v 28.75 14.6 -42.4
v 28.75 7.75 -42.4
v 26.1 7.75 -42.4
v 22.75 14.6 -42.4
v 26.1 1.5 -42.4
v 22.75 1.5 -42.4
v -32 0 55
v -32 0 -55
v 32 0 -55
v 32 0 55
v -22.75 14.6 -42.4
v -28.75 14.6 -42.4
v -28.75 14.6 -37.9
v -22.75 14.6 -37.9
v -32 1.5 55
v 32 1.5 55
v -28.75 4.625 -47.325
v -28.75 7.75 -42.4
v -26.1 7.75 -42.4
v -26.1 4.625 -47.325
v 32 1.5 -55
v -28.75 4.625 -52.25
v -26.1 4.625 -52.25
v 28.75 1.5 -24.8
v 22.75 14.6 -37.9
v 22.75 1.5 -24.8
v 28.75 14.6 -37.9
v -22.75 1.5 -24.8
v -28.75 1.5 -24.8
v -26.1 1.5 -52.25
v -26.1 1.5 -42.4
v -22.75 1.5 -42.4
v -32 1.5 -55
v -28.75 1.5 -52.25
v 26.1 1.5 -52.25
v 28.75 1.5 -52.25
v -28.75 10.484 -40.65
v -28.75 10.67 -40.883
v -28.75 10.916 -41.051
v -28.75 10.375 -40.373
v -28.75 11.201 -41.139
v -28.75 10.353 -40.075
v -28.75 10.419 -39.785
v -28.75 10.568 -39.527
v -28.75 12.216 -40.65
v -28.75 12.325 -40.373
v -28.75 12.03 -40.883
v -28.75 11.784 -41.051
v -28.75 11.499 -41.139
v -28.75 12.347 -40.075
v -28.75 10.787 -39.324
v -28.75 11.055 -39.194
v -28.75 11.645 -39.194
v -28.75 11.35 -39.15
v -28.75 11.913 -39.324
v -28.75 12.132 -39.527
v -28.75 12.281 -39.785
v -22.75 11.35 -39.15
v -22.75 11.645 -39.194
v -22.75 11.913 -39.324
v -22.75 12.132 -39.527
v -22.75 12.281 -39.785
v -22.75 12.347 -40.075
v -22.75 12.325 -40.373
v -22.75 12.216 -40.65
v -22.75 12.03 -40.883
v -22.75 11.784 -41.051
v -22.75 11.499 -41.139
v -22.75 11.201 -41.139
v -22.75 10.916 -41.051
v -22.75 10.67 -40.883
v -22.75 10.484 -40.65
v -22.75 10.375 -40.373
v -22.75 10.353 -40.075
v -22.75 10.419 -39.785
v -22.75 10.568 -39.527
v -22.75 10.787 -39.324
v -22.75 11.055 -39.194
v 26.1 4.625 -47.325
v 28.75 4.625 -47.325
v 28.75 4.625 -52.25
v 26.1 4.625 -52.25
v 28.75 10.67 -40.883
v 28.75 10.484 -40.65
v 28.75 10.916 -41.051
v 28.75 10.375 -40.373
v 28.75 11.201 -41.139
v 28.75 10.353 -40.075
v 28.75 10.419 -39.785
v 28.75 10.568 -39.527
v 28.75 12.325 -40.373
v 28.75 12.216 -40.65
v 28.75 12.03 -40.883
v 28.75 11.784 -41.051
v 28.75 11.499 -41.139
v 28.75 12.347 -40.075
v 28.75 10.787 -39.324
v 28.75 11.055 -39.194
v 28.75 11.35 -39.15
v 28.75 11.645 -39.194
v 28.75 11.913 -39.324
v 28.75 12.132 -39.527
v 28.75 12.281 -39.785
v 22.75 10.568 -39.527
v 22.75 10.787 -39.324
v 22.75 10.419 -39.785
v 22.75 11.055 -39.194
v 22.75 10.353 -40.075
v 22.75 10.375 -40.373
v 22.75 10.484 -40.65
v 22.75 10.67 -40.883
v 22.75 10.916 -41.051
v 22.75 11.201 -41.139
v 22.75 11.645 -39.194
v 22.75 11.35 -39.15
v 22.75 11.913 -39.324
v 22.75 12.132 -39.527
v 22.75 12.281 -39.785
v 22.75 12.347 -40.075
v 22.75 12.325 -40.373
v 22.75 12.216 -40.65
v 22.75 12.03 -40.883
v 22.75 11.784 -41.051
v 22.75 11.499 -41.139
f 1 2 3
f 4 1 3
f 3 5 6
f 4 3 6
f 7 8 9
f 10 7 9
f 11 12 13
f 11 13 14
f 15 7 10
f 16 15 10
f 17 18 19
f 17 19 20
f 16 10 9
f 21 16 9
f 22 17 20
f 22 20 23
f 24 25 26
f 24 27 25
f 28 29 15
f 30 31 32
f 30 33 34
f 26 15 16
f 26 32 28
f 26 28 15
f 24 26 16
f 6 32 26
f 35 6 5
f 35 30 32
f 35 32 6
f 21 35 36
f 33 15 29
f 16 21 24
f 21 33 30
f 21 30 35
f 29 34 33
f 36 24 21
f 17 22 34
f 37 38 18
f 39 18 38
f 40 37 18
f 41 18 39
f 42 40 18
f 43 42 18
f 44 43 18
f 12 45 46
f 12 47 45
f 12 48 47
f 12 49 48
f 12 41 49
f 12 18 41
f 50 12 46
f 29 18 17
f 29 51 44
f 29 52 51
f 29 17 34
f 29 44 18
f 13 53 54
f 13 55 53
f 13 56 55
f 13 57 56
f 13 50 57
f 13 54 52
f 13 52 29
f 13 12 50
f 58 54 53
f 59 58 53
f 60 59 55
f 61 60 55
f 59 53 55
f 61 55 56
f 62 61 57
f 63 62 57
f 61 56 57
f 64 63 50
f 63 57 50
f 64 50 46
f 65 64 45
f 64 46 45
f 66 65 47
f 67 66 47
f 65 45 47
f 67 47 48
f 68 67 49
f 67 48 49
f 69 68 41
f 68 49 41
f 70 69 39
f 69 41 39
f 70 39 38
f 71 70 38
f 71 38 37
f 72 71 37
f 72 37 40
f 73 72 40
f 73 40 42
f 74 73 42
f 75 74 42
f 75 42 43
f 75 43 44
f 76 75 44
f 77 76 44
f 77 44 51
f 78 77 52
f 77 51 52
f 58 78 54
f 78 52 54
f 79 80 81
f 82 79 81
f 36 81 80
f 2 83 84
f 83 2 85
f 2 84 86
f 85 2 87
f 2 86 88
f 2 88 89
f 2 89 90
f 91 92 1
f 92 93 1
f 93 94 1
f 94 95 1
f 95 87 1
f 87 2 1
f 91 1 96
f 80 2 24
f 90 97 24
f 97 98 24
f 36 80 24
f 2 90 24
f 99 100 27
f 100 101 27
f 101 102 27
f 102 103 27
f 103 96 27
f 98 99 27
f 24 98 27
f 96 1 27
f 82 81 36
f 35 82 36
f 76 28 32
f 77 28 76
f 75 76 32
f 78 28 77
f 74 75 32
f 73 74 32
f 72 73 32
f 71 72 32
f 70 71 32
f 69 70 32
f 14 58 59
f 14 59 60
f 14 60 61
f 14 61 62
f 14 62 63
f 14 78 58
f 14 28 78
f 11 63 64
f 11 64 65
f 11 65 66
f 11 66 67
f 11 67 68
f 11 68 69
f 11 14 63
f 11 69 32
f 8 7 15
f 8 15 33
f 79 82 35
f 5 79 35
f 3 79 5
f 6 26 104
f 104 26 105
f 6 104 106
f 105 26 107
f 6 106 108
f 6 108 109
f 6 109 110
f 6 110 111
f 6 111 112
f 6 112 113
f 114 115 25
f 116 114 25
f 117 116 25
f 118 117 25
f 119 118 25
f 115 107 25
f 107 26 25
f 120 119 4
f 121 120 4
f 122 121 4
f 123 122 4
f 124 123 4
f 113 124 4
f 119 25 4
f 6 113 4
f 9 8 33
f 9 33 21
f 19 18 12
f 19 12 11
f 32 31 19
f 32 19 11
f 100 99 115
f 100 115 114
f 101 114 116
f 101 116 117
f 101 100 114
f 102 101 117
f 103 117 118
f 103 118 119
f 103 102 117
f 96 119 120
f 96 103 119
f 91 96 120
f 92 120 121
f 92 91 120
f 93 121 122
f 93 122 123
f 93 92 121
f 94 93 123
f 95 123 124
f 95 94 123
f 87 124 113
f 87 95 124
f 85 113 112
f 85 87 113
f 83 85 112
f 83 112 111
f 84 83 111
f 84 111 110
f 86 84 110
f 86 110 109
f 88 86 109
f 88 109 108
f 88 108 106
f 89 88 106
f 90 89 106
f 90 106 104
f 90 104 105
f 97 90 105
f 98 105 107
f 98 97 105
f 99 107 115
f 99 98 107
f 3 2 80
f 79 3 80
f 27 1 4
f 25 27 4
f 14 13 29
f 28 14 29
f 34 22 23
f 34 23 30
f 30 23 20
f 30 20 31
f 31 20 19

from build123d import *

# Parameters (mm, degrees)
SKETCH1_W           = 64
SKETCH1_H           = 110
BOSS_EXTRUDE1_DEPTH = 1.5
SKETCH2_W           = 6
SKETCH2_H           = 4.5
BOSS_EXTRUDE2_DEPTH = 13.1
BOSS_EXTRUDE3_DEPTH = 2.65
BOSS_EXTRUDE4_DEPTH = 3.35
SKETCH7_R           = 1
CUT_EXTRUDE1_DEPTH  = 6


with BuildPart() as part:
    # Sketch1 → Boss-Extrude1 (new body)
    with BuildSketch(Plane(origin=(0, 0, 0), x_dir=(1, 0, 0), z_dir=(0, 1, 0))):
        Rectangle(SKETCH1_W, SKETCH1_H)
    extrude(amount=BOSS_EXTRUDE1_DEPTH)

    # Sketch2 → Boss-Extrude2 (add)
    with BuildSketch(Plane(origin=(0, 1.5, 0), x_dir=(1, 0, 0), z_dir=(0, 1, 0))):
        with Locations((-25.75, 40.15)):
            Rectangle(SKETCH2_W, SKETCH2_H)
    boss_extrude2 = extrude(amount=BOSS_EXTRUDE2_DEPTH)

    # Sketch3 → Boss-Extrude3 (add)
    with BuildSketch(Plane.ZY.offset(28.75)):
        Polygon((-42.4, 7.75), (-47.325, 4.625), (-52.25, 4.625), (-52.25, 1.5), (-42.4, 1.5), align=None)
        Polygon((-37.9, 14.6), (-24.8, 1.5), (-37.9, 1.5), align=None)
    boss_extrude3 = extrude(amount=-BOSS_EXTRUDE3_DEPTH)

    # Sketch6 → Boss-Extrude4 (add)
    with BuildSketch(Plane(origin=(-26.1, 0, 0), x_dir=(0, 0, -1), z_dir=(1, 0, 0))):
        Polygon((24.8, 1.5), (37.9, 1.5), (37.9, 14.6), align=None)
    boss_extrude4 = extrude(amount=BOSS_EXTRUDE4_DEPTH)

    # Sketch7 → Cut-Extrude1 (cut)
    with BuildSketch(Plane.ZY.offset(28.75)):
        with Locations((-40.15, 11.35)):
            Circle(SKETCH7_R)
    cut_extrude1 = extrude(amount=-CUT_EXTRUDE1_DEPTH, mode=Mode.SUBTRACT)

    # Mirror1: Boss-Extrude2, Boss-Extrude3, Boss-Extrude4, Cut-Extrude1 across plane
    add(boss_extrude2.mirror(Plane(origin=(0, 0, 0), x_dir=(0, 0, 1), z_dir=(1, 0, 0))))
    add(boss_extrude3.mirror(Plane(origin=(0, 0, 0), x_dir=(0, 0, 1), z_dir=(1, 0, 0))))
    add(boss_extrude4.mirror(Plane(origin=(0, 0, 0), x_dir=(0, 0, 1), z_dir=(1, 0, 0))))
    add(cut_extrude1.mirror(Plane(origin=(0, 0, 0), x_dir=(0, 0, 1), z_dir=(1, 0, 0))), mode=Mode.SUBTRACT)


solid = part.part
